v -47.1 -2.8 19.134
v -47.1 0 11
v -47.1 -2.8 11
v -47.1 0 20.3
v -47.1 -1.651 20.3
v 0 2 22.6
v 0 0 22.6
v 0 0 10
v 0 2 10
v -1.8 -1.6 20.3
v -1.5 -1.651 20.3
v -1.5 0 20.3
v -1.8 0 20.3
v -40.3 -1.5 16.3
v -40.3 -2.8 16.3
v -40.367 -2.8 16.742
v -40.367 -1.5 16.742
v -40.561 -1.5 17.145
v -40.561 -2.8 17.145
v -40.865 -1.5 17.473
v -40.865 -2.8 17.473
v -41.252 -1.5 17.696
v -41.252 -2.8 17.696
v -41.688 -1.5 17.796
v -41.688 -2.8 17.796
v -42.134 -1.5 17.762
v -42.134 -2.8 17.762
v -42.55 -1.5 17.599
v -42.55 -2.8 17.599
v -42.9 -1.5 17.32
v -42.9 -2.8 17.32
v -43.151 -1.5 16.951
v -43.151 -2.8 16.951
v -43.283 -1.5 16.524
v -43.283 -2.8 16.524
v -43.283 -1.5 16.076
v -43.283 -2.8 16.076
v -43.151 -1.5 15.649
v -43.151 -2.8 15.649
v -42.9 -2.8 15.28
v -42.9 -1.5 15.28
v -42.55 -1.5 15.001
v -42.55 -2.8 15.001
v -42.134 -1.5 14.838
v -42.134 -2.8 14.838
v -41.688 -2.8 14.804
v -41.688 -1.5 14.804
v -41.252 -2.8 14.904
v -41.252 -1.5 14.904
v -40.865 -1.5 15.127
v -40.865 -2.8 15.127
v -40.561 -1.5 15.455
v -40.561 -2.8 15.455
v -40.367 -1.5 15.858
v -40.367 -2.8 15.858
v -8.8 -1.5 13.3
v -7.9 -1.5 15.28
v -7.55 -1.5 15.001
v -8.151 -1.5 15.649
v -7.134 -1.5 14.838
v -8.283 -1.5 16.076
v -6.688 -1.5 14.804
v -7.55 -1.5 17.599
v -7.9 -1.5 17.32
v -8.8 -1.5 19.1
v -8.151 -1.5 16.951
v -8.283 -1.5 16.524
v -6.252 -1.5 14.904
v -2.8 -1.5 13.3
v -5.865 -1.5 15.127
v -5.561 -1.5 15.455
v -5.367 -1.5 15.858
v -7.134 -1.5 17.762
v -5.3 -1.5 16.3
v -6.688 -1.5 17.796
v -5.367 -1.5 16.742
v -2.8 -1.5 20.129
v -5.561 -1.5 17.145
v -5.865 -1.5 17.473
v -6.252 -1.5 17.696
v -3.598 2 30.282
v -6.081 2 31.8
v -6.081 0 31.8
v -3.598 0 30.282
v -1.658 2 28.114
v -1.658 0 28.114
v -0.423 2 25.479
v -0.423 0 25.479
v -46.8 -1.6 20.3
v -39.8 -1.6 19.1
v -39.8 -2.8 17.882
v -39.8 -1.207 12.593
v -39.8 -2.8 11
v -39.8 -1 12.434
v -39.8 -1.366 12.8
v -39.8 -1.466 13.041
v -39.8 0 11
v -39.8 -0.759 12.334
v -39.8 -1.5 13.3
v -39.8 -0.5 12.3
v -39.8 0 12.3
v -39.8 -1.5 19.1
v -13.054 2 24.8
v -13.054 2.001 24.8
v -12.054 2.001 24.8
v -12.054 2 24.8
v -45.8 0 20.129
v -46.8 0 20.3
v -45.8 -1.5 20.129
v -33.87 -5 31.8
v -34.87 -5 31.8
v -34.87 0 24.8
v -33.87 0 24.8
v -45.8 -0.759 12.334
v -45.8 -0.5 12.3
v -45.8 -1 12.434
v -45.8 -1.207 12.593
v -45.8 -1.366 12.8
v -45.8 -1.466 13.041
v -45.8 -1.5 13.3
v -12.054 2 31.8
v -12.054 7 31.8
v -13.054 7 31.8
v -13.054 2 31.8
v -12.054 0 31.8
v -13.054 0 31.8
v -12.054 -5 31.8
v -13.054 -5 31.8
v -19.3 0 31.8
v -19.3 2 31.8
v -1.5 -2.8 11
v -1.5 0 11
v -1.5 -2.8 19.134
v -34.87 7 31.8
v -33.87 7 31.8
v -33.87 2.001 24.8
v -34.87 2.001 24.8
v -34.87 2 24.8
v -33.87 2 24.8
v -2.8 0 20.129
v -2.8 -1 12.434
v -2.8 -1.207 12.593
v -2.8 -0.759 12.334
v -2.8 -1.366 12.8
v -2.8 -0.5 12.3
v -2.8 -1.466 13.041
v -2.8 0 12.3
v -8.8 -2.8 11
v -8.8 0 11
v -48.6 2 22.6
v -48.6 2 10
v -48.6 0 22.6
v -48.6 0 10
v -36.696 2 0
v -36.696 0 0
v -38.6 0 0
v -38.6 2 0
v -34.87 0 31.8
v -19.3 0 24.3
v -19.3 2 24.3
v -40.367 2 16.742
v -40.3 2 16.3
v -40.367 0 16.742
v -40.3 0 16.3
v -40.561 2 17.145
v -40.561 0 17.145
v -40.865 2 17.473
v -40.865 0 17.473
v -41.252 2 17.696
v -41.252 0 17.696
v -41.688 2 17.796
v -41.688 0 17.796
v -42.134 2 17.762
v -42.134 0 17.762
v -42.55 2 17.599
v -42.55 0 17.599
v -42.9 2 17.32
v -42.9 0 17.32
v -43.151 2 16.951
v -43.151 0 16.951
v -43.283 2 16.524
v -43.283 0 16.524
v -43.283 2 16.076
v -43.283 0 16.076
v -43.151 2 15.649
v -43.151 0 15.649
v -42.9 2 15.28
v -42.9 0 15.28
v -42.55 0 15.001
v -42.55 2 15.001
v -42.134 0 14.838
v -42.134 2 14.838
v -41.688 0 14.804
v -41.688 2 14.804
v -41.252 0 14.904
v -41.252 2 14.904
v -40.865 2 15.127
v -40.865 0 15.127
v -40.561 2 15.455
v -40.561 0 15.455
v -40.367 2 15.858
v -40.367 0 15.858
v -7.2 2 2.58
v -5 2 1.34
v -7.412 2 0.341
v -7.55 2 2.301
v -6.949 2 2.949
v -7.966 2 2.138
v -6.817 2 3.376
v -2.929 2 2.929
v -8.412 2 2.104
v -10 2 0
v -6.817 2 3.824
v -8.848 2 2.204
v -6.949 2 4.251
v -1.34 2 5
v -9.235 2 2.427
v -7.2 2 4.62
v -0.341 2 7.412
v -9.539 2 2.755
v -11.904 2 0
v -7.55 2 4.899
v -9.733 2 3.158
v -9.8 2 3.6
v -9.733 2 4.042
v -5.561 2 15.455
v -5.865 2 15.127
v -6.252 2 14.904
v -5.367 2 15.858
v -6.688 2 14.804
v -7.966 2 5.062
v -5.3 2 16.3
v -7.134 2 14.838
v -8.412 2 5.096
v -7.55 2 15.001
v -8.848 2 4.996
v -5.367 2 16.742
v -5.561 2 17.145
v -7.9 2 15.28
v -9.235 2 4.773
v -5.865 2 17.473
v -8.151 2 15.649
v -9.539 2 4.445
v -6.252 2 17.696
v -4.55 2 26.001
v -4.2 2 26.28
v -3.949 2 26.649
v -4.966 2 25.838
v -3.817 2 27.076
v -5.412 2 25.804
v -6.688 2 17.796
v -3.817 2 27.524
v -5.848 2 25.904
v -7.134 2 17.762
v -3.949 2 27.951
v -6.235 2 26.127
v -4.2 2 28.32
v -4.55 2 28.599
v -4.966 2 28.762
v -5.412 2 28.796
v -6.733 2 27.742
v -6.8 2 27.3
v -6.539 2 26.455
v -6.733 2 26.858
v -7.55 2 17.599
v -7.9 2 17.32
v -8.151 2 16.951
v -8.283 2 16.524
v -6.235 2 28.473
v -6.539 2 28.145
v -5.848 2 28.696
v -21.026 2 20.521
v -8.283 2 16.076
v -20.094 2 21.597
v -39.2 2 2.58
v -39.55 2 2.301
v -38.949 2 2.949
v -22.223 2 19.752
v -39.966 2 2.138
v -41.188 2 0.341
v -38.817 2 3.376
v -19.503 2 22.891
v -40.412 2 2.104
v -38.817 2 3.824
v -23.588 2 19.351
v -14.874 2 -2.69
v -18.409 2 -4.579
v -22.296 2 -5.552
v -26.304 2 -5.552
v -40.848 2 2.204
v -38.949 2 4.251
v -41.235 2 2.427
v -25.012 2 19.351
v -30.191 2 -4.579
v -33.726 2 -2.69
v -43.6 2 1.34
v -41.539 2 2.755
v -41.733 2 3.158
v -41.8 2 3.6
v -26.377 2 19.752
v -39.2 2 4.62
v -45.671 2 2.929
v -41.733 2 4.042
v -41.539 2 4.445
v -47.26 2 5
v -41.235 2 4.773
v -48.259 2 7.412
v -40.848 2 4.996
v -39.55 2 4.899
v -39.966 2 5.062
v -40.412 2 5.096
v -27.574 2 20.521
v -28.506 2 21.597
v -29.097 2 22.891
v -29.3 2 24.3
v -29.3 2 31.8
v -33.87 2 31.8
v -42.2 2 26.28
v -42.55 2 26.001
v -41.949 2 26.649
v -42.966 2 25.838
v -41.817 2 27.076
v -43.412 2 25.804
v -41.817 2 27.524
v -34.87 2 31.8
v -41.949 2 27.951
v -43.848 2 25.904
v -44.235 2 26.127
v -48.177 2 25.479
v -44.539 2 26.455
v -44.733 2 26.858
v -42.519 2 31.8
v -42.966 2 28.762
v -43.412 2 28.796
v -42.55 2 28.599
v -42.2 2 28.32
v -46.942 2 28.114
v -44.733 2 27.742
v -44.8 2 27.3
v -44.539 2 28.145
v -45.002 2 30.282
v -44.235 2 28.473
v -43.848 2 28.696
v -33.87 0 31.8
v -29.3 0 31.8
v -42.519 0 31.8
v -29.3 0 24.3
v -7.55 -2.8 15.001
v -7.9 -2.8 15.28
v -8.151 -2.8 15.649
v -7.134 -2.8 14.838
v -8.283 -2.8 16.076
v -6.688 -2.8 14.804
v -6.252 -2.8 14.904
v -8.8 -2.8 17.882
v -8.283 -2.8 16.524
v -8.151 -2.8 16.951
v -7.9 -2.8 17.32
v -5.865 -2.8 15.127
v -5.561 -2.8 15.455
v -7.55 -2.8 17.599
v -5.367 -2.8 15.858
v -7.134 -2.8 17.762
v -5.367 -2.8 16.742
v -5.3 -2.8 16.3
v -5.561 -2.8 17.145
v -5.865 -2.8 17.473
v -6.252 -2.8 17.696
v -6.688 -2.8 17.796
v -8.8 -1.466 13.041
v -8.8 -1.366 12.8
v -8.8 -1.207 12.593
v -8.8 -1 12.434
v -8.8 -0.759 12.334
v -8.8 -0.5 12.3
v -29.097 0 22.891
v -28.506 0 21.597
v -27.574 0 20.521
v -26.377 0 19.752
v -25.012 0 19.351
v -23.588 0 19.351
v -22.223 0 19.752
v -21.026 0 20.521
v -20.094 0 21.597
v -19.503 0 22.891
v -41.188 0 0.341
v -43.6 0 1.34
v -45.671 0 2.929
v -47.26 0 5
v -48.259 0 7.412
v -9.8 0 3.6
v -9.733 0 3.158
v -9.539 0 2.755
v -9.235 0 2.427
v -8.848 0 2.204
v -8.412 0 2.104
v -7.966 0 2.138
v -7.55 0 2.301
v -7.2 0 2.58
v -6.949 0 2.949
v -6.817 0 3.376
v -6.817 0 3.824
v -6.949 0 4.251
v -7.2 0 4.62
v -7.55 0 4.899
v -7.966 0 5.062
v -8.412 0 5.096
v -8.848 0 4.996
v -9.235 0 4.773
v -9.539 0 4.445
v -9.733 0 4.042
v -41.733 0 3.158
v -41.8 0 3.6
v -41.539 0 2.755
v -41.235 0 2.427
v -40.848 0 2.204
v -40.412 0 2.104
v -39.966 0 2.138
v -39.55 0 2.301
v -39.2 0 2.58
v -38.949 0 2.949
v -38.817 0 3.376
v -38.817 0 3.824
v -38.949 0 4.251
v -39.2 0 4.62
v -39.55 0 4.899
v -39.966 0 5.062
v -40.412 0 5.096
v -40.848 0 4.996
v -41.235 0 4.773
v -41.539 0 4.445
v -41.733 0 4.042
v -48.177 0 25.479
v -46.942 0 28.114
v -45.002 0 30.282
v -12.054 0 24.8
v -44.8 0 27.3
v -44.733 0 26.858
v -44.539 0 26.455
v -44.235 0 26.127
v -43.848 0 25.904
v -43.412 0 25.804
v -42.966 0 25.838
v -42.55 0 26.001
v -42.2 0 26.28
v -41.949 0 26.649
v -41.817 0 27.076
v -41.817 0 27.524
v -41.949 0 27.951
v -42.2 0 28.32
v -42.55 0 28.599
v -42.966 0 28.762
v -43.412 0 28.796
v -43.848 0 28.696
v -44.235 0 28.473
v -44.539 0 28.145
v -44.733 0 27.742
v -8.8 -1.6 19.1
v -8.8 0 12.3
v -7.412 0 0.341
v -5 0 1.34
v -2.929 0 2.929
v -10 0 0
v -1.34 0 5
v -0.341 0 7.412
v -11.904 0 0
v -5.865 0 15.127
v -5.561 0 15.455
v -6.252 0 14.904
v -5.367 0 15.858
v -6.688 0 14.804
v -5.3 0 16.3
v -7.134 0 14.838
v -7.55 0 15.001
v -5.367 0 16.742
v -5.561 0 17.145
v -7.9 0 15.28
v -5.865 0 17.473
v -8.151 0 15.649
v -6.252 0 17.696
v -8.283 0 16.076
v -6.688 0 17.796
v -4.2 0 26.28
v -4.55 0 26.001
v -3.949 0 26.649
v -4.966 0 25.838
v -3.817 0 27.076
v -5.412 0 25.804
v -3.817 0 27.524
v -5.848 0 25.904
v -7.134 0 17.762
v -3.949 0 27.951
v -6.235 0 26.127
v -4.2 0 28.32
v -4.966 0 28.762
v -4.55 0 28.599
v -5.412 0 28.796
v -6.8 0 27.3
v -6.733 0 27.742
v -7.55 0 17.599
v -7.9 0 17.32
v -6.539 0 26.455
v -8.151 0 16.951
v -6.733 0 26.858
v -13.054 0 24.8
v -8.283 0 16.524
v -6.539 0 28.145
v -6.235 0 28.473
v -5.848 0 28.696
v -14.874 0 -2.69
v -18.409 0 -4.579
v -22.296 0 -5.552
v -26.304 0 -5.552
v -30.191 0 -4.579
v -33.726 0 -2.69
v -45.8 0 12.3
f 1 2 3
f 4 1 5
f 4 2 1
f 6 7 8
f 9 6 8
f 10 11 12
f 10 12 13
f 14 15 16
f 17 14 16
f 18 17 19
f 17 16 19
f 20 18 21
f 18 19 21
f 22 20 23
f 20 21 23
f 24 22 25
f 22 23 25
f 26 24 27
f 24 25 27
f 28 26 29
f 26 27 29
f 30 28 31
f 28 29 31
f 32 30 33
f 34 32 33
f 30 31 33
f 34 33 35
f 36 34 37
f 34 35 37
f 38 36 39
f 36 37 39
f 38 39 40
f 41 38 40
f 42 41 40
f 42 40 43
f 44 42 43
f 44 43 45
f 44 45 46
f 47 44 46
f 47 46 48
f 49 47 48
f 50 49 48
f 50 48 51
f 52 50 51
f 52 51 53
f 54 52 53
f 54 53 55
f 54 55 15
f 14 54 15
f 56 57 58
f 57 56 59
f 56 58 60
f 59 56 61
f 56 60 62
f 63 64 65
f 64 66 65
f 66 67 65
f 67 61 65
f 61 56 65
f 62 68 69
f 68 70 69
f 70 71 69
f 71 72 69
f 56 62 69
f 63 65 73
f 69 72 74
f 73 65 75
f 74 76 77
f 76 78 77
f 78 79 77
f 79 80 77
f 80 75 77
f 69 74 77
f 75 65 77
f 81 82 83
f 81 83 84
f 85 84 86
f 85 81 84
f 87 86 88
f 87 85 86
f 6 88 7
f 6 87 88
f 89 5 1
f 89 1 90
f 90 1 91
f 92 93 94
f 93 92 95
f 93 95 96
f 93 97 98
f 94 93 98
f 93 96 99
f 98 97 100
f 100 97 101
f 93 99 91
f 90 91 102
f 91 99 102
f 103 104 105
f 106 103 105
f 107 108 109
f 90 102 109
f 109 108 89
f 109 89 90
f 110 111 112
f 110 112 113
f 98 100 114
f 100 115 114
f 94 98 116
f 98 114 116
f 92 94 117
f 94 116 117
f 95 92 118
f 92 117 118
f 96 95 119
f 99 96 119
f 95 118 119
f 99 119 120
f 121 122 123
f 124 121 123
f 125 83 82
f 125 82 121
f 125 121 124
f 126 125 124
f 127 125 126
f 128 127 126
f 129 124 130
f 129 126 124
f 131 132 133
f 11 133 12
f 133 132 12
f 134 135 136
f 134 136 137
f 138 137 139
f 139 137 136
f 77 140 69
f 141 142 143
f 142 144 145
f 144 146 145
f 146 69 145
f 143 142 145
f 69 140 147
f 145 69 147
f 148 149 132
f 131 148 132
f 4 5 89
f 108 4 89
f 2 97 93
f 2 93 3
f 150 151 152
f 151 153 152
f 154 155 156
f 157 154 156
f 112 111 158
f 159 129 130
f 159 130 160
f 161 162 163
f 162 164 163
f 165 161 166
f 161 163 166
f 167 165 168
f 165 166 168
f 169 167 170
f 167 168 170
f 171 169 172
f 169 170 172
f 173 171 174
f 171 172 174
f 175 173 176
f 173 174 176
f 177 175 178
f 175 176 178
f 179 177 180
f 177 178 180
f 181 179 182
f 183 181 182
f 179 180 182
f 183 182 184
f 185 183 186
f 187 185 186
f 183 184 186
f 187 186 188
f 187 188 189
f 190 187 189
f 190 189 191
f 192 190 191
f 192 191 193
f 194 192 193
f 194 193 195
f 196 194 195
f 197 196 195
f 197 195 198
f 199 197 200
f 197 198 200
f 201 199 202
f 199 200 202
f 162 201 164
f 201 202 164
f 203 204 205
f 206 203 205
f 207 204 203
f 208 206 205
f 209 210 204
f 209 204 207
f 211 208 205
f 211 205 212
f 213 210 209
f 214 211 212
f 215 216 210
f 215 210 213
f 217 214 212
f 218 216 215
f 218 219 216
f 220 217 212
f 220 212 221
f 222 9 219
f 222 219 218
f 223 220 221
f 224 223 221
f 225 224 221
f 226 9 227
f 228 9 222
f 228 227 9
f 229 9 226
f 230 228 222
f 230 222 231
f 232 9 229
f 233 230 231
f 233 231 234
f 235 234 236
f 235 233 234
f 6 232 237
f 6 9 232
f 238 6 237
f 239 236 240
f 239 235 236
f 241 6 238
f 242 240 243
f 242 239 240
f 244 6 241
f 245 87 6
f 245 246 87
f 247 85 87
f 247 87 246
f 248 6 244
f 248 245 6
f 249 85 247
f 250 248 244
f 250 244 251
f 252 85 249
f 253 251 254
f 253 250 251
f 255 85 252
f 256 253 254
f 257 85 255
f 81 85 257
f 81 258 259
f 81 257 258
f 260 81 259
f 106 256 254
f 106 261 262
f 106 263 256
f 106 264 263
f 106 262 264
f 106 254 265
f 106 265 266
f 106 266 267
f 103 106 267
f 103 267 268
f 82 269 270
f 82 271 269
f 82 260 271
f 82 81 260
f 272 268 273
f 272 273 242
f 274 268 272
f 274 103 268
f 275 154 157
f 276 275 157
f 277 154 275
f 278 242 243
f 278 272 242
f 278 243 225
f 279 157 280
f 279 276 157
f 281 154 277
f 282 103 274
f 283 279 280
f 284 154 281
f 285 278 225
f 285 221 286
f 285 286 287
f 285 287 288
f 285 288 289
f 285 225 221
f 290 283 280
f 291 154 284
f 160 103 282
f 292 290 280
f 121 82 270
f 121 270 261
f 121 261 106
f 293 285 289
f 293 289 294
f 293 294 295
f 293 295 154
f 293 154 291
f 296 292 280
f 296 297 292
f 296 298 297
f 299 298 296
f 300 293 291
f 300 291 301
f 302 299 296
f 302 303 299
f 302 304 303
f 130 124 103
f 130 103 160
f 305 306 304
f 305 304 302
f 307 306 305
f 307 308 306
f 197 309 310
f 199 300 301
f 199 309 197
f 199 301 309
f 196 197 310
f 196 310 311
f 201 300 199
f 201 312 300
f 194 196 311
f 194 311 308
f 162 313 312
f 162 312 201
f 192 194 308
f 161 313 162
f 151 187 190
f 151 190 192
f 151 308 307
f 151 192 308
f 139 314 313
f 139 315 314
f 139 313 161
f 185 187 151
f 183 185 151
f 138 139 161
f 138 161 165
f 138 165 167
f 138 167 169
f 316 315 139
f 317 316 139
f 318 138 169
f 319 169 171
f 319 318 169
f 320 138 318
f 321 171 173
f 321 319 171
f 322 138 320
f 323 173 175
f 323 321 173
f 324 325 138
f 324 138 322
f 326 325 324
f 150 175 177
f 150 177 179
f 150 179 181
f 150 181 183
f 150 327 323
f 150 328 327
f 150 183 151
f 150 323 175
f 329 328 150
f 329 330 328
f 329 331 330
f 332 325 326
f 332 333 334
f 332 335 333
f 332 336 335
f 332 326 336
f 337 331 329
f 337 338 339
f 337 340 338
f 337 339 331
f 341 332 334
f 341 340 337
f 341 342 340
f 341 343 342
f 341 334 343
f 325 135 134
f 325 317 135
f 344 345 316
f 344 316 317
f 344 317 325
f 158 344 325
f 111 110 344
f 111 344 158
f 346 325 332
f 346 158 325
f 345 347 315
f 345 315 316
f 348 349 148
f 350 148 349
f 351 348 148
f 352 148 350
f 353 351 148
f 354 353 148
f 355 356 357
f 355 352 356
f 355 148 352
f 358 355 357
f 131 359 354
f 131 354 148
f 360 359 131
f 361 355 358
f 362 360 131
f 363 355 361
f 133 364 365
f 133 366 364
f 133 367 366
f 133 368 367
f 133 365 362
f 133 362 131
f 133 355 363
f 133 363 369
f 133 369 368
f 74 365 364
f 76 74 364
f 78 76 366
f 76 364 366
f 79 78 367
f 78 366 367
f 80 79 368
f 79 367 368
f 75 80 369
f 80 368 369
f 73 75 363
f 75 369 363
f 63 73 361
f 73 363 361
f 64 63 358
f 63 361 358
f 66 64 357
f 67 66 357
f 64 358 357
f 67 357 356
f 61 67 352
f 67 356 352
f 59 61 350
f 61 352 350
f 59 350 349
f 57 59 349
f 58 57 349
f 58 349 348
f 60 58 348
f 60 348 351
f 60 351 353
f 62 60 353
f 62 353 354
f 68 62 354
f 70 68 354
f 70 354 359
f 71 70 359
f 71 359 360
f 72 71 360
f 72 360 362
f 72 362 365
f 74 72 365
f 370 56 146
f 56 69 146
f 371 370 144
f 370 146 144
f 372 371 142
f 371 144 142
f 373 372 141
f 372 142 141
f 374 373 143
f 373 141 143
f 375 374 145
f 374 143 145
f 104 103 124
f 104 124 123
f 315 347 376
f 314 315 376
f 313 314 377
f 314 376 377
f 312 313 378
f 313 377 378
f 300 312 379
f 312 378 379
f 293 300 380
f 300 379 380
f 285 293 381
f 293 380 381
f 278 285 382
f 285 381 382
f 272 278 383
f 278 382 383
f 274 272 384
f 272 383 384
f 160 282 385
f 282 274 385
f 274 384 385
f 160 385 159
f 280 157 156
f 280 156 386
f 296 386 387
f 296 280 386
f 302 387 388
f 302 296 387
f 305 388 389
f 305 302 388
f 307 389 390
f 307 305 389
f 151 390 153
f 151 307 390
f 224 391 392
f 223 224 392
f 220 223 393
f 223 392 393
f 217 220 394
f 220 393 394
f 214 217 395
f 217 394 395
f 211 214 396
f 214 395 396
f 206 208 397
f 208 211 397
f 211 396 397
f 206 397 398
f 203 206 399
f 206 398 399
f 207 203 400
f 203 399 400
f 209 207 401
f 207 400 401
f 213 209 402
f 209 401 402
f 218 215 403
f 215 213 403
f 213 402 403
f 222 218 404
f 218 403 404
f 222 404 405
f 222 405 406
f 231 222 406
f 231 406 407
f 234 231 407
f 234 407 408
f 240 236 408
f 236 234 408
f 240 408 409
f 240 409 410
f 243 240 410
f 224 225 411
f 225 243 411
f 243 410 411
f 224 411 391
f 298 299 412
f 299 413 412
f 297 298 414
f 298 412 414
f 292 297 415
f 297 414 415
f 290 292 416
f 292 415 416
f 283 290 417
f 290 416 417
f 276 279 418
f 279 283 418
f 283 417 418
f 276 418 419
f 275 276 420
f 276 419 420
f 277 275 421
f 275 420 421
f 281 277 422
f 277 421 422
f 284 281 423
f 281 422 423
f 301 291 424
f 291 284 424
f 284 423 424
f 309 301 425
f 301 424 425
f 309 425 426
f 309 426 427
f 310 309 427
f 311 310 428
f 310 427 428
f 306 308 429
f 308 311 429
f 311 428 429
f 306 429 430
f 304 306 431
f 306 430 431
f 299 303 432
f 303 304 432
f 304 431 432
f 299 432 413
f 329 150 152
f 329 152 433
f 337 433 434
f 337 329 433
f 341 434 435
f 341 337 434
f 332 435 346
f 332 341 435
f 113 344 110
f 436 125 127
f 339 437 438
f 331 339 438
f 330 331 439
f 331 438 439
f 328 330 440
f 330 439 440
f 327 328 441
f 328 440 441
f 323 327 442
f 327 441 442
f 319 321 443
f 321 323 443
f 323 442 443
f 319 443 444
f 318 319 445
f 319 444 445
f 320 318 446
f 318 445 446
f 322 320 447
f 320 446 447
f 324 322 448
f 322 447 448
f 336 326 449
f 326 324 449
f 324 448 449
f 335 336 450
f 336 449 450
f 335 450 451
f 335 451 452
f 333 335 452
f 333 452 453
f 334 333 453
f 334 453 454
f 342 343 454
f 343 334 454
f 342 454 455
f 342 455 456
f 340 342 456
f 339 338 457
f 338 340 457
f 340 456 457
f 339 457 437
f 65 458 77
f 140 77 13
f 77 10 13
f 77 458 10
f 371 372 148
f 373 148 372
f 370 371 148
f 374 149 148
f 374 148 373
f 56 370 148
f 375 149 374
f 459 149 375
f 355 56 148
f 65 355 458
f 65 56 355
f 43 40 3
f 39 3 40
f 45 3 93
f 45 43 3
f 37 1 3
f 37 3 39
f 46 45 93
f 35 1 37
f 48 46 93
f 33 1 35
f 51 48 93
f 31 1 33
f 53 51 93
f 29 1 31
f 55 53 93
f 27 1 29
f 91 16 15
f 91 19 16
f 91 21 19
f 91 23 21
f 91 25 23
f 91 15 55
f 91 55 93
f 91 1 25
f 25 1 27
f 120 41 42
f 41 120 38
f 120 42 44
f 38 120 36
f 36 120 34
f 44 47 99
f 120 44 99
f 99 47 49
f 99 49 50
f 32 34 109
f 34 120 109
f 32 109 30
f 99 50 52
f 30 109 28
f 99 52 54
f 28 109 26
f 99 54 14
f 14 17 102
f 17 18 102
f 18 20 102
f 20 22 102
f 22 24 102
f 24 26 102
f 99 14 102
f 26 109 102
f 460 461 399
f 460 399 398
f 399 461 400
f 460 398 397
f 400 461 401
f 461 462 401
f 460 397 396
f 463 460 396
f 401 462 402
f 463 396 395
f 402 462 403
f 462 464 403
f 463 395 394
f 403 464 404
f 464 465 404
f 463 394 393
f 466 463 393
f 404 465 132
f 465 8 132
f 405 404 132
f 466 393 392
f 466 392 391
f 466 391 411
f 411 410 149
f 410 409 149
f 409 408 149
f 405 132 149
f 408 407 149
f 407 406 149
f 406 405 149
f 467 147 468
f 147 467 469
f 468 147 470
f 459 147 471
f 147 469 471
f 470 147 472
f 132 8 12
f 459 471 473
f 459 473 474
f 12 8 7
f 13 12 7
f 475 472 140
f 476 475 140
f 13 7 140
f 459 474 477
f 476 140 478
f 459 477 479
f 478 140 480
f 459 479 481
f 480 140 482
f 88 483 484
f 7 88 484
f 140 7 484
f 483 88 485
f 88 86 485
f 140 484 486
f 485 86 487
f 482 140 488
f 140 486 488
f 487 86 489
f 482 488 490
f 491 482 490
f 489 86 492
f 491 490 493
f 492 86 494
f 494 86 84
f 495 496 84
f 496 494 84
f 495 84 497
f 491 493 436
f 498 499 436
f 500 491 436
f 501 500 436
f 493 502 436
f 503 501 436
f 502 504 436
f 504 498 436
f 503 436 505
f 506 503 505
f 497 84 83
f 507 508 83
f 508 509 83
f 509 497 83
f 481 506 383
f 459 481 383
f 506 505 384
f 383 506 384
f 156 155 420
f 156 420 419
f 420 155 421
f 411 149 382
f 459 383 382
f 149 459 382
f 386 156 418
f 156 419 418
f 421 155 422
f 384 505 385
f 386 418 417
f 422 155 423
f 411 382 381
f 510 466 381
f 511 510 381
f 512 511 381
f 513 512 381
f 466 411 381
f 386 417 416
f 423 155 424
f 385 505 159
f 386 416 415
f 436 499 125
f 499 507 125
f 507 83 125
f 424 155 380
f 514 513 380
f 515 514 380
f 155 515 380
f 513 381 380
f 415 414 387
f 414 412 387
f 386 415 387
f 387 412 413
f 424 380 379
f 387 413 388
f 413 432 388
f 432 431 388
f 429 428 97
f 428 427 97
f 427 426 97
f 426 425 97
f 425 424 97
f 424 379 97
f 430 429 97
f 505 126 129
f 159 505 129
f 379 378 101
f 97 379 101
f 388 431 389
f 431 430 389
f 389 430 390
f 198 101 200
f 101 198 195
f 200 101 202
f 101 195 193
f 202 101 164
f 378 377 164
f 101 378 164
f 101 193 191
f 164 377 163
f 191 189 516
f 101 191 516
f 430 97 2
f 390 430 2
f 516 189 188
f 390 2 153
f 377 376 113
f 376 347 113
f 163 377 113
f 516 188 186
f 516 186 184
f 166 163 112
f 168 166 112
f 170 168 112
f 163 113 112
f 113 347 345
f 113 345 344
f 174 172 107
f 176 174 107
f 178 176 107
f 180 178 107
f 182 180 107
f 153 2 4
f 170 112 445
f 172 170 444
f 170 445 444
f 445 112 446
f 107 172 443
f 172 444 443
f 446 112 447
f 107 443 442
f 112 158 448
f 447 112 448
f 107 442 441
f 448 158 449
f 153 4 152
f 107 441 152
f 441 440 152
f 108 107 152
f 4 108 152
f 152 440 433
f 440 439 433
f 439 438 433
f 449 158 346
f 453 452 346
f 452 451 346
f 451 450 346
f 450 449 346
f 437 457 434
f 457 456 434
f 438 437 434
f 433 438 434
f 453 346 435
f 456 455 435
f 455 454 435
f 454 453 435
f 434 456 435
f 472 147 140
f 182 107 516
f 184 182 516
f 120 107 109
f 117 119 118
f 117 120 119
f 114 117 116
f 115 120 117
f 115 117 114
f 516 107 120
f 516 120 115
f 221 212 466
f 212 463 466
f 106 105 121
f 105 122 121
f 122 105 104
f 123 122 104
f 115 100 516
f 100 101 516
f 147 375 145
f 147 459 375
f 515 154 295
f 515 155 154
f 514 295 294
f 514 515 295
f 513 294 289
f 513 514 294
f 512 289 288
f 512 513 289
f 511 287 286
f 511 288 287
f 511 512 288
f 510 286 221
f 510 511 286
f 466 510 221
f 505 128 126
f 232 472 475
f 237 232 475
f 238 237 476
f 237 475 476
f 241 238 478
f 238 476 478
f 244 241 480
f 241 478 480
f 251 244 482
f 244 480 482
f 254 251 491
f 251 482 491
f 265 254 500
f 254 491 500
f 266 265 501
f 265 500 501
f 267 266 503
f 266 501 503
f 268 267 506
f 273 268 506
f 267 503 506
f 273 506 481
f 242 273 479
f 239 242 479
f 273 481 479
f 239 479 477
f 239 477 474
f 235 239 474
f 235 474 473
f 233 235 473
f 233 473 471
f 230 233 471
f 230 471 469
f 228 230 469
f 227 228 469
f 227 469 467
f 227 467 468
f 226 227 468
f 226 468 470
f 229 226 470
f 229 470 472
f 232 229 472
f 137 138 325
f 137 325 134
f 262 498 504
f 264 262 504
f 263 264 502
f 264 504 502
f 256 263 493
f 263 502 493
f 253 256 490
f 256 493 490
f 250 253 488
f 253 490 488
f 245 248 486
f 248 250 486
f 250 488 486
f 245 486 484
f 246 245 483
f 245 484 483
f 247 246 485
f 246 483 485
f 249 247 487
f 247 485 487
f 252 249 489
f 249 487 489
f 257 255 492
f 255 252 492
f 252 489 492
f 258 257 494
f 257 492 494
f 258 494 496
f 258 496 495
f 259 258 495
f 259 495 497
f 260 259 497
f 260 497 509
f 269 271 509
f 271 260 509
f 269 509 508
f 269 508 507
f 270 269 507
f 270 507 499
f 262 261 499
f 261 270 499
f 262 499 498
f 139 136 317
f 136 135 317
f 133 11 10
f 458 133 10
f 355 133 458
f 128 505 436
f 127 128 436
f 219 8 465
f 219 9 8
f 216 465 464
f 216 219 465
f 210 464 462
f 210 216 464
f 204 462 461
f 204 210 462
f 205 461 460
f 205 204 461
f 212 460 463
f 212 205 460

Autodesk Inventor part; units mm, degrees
ref_plane "YZ Plane" through (0, 0, 0) normal (1, 0, 0) x (0, 1, 0)
ref_plane "XZ Plane" through (0, 0, 0) normal (0, 1, 0) x (-1, 0, 0)
ref_plane "XY Plane" through (0, 0, 0) normal (0, 0, 1) x (1, 0, 0)
sketch "スケッチ8" plane through (0, 0, 0) normal (0, 1, 0) x (-1, 0, 0)
  line L0 (0, 0) -> (48.6, 0)
  line L1 (48.6, 0) -> (48.6, 32.6)
  line L2 (48.6, 32.6) -> (0, 32.6)
  line L3 (0, 32.6) -> (0, 0)
  circle A0 centre (5.3, 27.3) radius 1.5
  circle A1 centre (43.3, 27.3) radius 1.5
  circle A2 centre (8.3, 3.6) radius 1.5
  circle A3 centre (40.3, 3.6) radius 1.5
  circle A4 centre (24.3, 24.3) radius 5
  line L4 (19.3, 24.3) -> (29.3, 24.3)
  line L5 (29.3, 24.3) -> (29.3, 32.6)
  line L6 (29.3, 32.6) -> (19.3, 32.6)
  line L7 (19.3, 32.6) -> (19.3, 24.3)
  line L8 (0, 32.6) -> (48.6, 32.6)
  line L9 (48.6, 32.6) -> (48.6, 36.8)
  line L10 (48.6, 36.8) -> (0, 36.8)
  line L11 (0, 36.8) -> (0, 32.6)
  arc A5 (11.9042, 0) -> (36.6958, 0) centre (24.3, 10.7) ccw
  arc A6 (29.3, 25.8987) -> (29.0048, 25.9926) centre (24.3, 10.7) ccw
  arc A7 (19.5952, 25.9926) -> (19.3, 25.8987) centre (24.3, 10.7) ccw
  line L12 (11.9042, 0) -> (36.6958, 0)
  dimension "d42" = 32.6
  dimension "d43" = 48.6
  dimension "d44" = 3
  dimension "d45" = 3
  dimension "d46" = 3
  dimension "d47" = 3
  dimension "d48" = 38
  dimension "d49" = 32
  dimension "d50" = 5.3
  dimension "d51" = 8.3
  dimension "d52" = 5.3
  dimension "d53" = 0
  dimension "d54" = 3.6
  dimension "d55" = 0
  dimension "d56" = 10
  dimension "d57" = 19
  dimension "d58" = 8.3
  dimension "d61" = 36.8
  dimension "d103" = 10.7
  dimension "d104" = 0
extrude "押し出し8" add sketch "スケッチ8" along normal blind 2 contours L3 L2 L7 A4 L5 L1 L0 | L0 A5
fillet "フィレット3" radius 10 4 edges at (0, 1, 32.6) (0, 1, 0) (-48.6, 1, 0) (-48.6, 1, 32.6)
sketch "スケッチ9" plane through (0, 0, 0) normal (0, -1, 0) x (1, 0, 0)
  line L0 (-10, 0) -> (-38.6, 0) projected
  line L1 (-48.5604, 35.5868) -> (6.5479, 35.5868)
  line L2 (6.5479, 35.5868) -> (6.5479, 31.8)
  line L3 (6.5479, 31.8) -> (-48.5604, 31.8)
  line L4 (-48.5604, 31.8) -> (-48.5604, 35.5868)
  point P0 (0, 0)
  dimension "d63" = 31.8
extrude "押し出し9" cut sketch "スケッチ9" against normal blind 2
sketch "スケッチ10" plane through (0, 0, 0) normal (0, -1, 0) x (1, 0, 0)
  arc A0 (-29.3, 24.3) -> (-19.3, 24.3) centre (-24.3, 24.3) ccw projected
  line L0 (-47.1, 20.3) -> (-45.8, 20.3)
  line L1 (-45.8, 20.3) -> (-45.8, 11)
  line L2 (-45.8, 11) -> (-47.1, 11)
  line L3 (-47.1, 11) -> (-47.1, 20.3)
  line L4 (-47.1, 11) -> (-39.8, 11)
  line L5 (-39.8, 11) -> (-39.8, 12.3)
  line L6 (-39.8, 12.3) -> (-47.1, 12.3)
  line L7 (-47.1, 12.3) -> (-47.1, 11)
  line L8 (-1.5, 20.3) -> (-2.8, 20.3)
  line L9 (-2.8, 20.3) -> (-2.8, 11)
  line L10 (-2.8, 11) -> (-1.5, 11)
  line L11 (-1.5, 11) -> (-1.5, 20.3)
  line L12 (-1.5, 11) -> (-8.8, 11)
  line L13 (-8.8, 11) -> (-8.8, 12.3)
  line L14 (-8.8, 12.3) -> (-1.5, 12.3)
  line L15 (-1.5, 12.3) -> (-1.5, 11)
  point P0 (0, 0)
  dimension "d66" = 43
  dimension "d67" = 21.5
  dimension "d68" = 1.3
  dimension "d69" = 1.3
  dimension "d70" = 1.3
  dimension "d71" = 1.3
  dimension "d72" = 0
  dimension "d73" = 8
  dimension "d74" = 8
  dimension "d75" = 12
  dimension "d76" = 6
  dimension "d77" = 6
extrude "押し出し10" add sketch "スケッチ10" along normal blind 1.5
sketch "スケッチ11" plane through (0, -1.5, 0) normal (0, -1, 0) x (1, 0, 0)
  line L0 (-45.8, 12.3) -> (-45.8, 20.3) projected
  line L1 (-45.8, 20.3) -> (-47.1, 20.3) projected
  line L2 (-47.1, 20.3) -> (-47.1, 11) projected
  line L3 (-47.1, 11) -> (-39.8, 11) projected
  line L4 (-39.8, 11) -> (-39.8, 12.3) projected
  line L5 (-39.8, 12.3) -> (-45.8, 12.3) projected
  line L6 (-47.1, 11) -> (-39.8, 11)
  line L7 (-39.8, 11) -> (-39.8, 20.3)
  line L8 (-39.8, 20.3) -> (-47.1, 20.3)
  line L9 (-47.1, 20.3) -> (-47.1, 11)
  line L10 (-1.5, 11) -> (-8.8, 11)
  line L11 (-8.8, 11) -> (-8.8, 20.3)
  line L12 (-8.8, 20.3) -> (-1.5, 20.3)
  line L13 (-1.5, 20.3) -> (-1.5, 11)
  point P0 (0, 0)
extrude "押し出し11" add sketch "スケッチ11" along normal blind 1.3
sketch "スケッチ12" plane through (0, -2.8, 0) normal (0, -1, 0) x (1, 0, 0)
  line L0 (-47.1, 11) -> (-39.8, 11) projected
  line L1 (-39.8, 11) -> (-39.8, 20.3) projected
  line L2 (-39.8, 20.3) -> (-47.1, 20.3) projected
  line L3 (-47.1, 20.3) -> (-47.1, 11) projected
  circle A0 centre (-41.8, 16.3) radius 1.5
  circle A1 centre (-6.8, 16.3) radius 1.5
  arc A2 (-29.3, 24.3) -> (-19.3, 24.3) centre (-24.3, 24.3) ccw projected
  point P0 (0, 0)
  dimension "d82" = 3
  dimension "d83" = 3
  dimension "d84" = 35
  dimension "d85" = 17.5
  dimension "d86" = 0
  dimension "d87" = 8
extrude "押し出し12" cut sketch "スケッチ12" against normal blind 10 contours A0 | A1
chamfer "面取り3" distance 1.2 distance2 7 1 edges at (-39.8, -2.15, 20.3) measured on face at (-39.8, -2.3667, 14.5333)
chamfer "面取り4" distance 1.2 distance2 7 1 edges at (-8.8, -2.15, 20.3) measured on face at (-8.8, -2.3667, 14.5333)
chamfer "面取り5" distance 1.2 angle 45 2 edges at (-43.3, -2.8, 19.7) (-5.3, -2.8, 19.7)
sketch "スケッチ14" plane through (-19.3, 0, 31.8) normal (0, 0, 1) x (1, 0, 0)
  line L0 (13.2192, 0) -> (0, 0) projected
  line L1 (0, 2) -> (13.2192, 2) projected
  line L2 (-10, 2) -> (-10, 0) projected
  line L3 (-23.2192, 2) -> (-10, 2) projected
  line L4 (-23.2192, 0) -> (-23.2192, 2) projected
  line L5 (-10, 0) -> (-23.2192, 0) projected
  line L6 (-15.5703, 7) -> (-14.5703, 7)
  line L7 (-14.5703, 7) -> (-14.5703, -5)
  line L8 (-14.5703, -5) -> (-15.5703, -5)
  line L9 (-15.5703, -5) -> (-15.5703, 7)
  line L10 (6.2462, 7) -> (7.2462, 7)
  line L11 (7.2462, 7) -> (7.2462, -5)
  line L12 (7.2462, -5) -> (6.2462, -5)
  line L13 (6.2462, -5) -> (6.2462, 7)
  point P0 (19.3, 0)
  dimension "d114" = 1
  dimension "d115" = 1
  dimension "d116" = 5
  dimension "d117" = 5
  dimension "d118" = 5
  dimension "d119" = 5
extrude "押し出し14" add sketch "スケッチ14" against normal blind 7 contours L11 L12 L13 L0 | L0 L13 L1 L11 | L1 L13 L10 L11 | L7 L5 L9 L3 | L3 L9 L6 L7 | L7 L8 L9 L5
chamfer "面取り6" distance 5 distance2 7 1 edges at (-12.5538, -5, 24.8) measured on face at (-12.7204, -1.6667, 24.8)
chamfer "面取り7" distance 5 distance2 7 1 edges at (-34.3703, -5, 24.8) measured on face at (-34.5369, -1.6667, 24.8)
chamfer "面取り8" distance 5 distance2 7 1 edges at (-12.5538, 7, 24.8) measured on face at (-12.7204, 5.3333, 24.8)
chamfer "面取り9" distance 5 distance2 7 1 edges at (-34.3703, 7, 24.8) measured on face at (-34.5369, 5.3333, 24.8)
fillet "フィレット5" radius 1 2 edges at (-42.8, -1.5, 12.3) (-5.8, -1.5, 12.3)
equation "\"d45\" = d44"
equation "\"d46\" = d44"
equation "\"d47\" = d44"
equation "\"d57\" = 0.5 * d48"
equation "\"d67\" = 0.5 * d66"
equation "\"d69\" = d68"
equation "\"d70\" = d68"
equation "\"d71\" = d70"
equation "\"d74\" = d73"
equation "\"d77\" = d76"
equation "\"d83\" = d82"
equation "\"d85\" = 0.5 * d84"
equation "\"d115\" = d114"
equation "\"d117\" = d116"
equation "\"d118\" = d117"
equation "\"d119\" = d116"
properties part number "motor-holder"
